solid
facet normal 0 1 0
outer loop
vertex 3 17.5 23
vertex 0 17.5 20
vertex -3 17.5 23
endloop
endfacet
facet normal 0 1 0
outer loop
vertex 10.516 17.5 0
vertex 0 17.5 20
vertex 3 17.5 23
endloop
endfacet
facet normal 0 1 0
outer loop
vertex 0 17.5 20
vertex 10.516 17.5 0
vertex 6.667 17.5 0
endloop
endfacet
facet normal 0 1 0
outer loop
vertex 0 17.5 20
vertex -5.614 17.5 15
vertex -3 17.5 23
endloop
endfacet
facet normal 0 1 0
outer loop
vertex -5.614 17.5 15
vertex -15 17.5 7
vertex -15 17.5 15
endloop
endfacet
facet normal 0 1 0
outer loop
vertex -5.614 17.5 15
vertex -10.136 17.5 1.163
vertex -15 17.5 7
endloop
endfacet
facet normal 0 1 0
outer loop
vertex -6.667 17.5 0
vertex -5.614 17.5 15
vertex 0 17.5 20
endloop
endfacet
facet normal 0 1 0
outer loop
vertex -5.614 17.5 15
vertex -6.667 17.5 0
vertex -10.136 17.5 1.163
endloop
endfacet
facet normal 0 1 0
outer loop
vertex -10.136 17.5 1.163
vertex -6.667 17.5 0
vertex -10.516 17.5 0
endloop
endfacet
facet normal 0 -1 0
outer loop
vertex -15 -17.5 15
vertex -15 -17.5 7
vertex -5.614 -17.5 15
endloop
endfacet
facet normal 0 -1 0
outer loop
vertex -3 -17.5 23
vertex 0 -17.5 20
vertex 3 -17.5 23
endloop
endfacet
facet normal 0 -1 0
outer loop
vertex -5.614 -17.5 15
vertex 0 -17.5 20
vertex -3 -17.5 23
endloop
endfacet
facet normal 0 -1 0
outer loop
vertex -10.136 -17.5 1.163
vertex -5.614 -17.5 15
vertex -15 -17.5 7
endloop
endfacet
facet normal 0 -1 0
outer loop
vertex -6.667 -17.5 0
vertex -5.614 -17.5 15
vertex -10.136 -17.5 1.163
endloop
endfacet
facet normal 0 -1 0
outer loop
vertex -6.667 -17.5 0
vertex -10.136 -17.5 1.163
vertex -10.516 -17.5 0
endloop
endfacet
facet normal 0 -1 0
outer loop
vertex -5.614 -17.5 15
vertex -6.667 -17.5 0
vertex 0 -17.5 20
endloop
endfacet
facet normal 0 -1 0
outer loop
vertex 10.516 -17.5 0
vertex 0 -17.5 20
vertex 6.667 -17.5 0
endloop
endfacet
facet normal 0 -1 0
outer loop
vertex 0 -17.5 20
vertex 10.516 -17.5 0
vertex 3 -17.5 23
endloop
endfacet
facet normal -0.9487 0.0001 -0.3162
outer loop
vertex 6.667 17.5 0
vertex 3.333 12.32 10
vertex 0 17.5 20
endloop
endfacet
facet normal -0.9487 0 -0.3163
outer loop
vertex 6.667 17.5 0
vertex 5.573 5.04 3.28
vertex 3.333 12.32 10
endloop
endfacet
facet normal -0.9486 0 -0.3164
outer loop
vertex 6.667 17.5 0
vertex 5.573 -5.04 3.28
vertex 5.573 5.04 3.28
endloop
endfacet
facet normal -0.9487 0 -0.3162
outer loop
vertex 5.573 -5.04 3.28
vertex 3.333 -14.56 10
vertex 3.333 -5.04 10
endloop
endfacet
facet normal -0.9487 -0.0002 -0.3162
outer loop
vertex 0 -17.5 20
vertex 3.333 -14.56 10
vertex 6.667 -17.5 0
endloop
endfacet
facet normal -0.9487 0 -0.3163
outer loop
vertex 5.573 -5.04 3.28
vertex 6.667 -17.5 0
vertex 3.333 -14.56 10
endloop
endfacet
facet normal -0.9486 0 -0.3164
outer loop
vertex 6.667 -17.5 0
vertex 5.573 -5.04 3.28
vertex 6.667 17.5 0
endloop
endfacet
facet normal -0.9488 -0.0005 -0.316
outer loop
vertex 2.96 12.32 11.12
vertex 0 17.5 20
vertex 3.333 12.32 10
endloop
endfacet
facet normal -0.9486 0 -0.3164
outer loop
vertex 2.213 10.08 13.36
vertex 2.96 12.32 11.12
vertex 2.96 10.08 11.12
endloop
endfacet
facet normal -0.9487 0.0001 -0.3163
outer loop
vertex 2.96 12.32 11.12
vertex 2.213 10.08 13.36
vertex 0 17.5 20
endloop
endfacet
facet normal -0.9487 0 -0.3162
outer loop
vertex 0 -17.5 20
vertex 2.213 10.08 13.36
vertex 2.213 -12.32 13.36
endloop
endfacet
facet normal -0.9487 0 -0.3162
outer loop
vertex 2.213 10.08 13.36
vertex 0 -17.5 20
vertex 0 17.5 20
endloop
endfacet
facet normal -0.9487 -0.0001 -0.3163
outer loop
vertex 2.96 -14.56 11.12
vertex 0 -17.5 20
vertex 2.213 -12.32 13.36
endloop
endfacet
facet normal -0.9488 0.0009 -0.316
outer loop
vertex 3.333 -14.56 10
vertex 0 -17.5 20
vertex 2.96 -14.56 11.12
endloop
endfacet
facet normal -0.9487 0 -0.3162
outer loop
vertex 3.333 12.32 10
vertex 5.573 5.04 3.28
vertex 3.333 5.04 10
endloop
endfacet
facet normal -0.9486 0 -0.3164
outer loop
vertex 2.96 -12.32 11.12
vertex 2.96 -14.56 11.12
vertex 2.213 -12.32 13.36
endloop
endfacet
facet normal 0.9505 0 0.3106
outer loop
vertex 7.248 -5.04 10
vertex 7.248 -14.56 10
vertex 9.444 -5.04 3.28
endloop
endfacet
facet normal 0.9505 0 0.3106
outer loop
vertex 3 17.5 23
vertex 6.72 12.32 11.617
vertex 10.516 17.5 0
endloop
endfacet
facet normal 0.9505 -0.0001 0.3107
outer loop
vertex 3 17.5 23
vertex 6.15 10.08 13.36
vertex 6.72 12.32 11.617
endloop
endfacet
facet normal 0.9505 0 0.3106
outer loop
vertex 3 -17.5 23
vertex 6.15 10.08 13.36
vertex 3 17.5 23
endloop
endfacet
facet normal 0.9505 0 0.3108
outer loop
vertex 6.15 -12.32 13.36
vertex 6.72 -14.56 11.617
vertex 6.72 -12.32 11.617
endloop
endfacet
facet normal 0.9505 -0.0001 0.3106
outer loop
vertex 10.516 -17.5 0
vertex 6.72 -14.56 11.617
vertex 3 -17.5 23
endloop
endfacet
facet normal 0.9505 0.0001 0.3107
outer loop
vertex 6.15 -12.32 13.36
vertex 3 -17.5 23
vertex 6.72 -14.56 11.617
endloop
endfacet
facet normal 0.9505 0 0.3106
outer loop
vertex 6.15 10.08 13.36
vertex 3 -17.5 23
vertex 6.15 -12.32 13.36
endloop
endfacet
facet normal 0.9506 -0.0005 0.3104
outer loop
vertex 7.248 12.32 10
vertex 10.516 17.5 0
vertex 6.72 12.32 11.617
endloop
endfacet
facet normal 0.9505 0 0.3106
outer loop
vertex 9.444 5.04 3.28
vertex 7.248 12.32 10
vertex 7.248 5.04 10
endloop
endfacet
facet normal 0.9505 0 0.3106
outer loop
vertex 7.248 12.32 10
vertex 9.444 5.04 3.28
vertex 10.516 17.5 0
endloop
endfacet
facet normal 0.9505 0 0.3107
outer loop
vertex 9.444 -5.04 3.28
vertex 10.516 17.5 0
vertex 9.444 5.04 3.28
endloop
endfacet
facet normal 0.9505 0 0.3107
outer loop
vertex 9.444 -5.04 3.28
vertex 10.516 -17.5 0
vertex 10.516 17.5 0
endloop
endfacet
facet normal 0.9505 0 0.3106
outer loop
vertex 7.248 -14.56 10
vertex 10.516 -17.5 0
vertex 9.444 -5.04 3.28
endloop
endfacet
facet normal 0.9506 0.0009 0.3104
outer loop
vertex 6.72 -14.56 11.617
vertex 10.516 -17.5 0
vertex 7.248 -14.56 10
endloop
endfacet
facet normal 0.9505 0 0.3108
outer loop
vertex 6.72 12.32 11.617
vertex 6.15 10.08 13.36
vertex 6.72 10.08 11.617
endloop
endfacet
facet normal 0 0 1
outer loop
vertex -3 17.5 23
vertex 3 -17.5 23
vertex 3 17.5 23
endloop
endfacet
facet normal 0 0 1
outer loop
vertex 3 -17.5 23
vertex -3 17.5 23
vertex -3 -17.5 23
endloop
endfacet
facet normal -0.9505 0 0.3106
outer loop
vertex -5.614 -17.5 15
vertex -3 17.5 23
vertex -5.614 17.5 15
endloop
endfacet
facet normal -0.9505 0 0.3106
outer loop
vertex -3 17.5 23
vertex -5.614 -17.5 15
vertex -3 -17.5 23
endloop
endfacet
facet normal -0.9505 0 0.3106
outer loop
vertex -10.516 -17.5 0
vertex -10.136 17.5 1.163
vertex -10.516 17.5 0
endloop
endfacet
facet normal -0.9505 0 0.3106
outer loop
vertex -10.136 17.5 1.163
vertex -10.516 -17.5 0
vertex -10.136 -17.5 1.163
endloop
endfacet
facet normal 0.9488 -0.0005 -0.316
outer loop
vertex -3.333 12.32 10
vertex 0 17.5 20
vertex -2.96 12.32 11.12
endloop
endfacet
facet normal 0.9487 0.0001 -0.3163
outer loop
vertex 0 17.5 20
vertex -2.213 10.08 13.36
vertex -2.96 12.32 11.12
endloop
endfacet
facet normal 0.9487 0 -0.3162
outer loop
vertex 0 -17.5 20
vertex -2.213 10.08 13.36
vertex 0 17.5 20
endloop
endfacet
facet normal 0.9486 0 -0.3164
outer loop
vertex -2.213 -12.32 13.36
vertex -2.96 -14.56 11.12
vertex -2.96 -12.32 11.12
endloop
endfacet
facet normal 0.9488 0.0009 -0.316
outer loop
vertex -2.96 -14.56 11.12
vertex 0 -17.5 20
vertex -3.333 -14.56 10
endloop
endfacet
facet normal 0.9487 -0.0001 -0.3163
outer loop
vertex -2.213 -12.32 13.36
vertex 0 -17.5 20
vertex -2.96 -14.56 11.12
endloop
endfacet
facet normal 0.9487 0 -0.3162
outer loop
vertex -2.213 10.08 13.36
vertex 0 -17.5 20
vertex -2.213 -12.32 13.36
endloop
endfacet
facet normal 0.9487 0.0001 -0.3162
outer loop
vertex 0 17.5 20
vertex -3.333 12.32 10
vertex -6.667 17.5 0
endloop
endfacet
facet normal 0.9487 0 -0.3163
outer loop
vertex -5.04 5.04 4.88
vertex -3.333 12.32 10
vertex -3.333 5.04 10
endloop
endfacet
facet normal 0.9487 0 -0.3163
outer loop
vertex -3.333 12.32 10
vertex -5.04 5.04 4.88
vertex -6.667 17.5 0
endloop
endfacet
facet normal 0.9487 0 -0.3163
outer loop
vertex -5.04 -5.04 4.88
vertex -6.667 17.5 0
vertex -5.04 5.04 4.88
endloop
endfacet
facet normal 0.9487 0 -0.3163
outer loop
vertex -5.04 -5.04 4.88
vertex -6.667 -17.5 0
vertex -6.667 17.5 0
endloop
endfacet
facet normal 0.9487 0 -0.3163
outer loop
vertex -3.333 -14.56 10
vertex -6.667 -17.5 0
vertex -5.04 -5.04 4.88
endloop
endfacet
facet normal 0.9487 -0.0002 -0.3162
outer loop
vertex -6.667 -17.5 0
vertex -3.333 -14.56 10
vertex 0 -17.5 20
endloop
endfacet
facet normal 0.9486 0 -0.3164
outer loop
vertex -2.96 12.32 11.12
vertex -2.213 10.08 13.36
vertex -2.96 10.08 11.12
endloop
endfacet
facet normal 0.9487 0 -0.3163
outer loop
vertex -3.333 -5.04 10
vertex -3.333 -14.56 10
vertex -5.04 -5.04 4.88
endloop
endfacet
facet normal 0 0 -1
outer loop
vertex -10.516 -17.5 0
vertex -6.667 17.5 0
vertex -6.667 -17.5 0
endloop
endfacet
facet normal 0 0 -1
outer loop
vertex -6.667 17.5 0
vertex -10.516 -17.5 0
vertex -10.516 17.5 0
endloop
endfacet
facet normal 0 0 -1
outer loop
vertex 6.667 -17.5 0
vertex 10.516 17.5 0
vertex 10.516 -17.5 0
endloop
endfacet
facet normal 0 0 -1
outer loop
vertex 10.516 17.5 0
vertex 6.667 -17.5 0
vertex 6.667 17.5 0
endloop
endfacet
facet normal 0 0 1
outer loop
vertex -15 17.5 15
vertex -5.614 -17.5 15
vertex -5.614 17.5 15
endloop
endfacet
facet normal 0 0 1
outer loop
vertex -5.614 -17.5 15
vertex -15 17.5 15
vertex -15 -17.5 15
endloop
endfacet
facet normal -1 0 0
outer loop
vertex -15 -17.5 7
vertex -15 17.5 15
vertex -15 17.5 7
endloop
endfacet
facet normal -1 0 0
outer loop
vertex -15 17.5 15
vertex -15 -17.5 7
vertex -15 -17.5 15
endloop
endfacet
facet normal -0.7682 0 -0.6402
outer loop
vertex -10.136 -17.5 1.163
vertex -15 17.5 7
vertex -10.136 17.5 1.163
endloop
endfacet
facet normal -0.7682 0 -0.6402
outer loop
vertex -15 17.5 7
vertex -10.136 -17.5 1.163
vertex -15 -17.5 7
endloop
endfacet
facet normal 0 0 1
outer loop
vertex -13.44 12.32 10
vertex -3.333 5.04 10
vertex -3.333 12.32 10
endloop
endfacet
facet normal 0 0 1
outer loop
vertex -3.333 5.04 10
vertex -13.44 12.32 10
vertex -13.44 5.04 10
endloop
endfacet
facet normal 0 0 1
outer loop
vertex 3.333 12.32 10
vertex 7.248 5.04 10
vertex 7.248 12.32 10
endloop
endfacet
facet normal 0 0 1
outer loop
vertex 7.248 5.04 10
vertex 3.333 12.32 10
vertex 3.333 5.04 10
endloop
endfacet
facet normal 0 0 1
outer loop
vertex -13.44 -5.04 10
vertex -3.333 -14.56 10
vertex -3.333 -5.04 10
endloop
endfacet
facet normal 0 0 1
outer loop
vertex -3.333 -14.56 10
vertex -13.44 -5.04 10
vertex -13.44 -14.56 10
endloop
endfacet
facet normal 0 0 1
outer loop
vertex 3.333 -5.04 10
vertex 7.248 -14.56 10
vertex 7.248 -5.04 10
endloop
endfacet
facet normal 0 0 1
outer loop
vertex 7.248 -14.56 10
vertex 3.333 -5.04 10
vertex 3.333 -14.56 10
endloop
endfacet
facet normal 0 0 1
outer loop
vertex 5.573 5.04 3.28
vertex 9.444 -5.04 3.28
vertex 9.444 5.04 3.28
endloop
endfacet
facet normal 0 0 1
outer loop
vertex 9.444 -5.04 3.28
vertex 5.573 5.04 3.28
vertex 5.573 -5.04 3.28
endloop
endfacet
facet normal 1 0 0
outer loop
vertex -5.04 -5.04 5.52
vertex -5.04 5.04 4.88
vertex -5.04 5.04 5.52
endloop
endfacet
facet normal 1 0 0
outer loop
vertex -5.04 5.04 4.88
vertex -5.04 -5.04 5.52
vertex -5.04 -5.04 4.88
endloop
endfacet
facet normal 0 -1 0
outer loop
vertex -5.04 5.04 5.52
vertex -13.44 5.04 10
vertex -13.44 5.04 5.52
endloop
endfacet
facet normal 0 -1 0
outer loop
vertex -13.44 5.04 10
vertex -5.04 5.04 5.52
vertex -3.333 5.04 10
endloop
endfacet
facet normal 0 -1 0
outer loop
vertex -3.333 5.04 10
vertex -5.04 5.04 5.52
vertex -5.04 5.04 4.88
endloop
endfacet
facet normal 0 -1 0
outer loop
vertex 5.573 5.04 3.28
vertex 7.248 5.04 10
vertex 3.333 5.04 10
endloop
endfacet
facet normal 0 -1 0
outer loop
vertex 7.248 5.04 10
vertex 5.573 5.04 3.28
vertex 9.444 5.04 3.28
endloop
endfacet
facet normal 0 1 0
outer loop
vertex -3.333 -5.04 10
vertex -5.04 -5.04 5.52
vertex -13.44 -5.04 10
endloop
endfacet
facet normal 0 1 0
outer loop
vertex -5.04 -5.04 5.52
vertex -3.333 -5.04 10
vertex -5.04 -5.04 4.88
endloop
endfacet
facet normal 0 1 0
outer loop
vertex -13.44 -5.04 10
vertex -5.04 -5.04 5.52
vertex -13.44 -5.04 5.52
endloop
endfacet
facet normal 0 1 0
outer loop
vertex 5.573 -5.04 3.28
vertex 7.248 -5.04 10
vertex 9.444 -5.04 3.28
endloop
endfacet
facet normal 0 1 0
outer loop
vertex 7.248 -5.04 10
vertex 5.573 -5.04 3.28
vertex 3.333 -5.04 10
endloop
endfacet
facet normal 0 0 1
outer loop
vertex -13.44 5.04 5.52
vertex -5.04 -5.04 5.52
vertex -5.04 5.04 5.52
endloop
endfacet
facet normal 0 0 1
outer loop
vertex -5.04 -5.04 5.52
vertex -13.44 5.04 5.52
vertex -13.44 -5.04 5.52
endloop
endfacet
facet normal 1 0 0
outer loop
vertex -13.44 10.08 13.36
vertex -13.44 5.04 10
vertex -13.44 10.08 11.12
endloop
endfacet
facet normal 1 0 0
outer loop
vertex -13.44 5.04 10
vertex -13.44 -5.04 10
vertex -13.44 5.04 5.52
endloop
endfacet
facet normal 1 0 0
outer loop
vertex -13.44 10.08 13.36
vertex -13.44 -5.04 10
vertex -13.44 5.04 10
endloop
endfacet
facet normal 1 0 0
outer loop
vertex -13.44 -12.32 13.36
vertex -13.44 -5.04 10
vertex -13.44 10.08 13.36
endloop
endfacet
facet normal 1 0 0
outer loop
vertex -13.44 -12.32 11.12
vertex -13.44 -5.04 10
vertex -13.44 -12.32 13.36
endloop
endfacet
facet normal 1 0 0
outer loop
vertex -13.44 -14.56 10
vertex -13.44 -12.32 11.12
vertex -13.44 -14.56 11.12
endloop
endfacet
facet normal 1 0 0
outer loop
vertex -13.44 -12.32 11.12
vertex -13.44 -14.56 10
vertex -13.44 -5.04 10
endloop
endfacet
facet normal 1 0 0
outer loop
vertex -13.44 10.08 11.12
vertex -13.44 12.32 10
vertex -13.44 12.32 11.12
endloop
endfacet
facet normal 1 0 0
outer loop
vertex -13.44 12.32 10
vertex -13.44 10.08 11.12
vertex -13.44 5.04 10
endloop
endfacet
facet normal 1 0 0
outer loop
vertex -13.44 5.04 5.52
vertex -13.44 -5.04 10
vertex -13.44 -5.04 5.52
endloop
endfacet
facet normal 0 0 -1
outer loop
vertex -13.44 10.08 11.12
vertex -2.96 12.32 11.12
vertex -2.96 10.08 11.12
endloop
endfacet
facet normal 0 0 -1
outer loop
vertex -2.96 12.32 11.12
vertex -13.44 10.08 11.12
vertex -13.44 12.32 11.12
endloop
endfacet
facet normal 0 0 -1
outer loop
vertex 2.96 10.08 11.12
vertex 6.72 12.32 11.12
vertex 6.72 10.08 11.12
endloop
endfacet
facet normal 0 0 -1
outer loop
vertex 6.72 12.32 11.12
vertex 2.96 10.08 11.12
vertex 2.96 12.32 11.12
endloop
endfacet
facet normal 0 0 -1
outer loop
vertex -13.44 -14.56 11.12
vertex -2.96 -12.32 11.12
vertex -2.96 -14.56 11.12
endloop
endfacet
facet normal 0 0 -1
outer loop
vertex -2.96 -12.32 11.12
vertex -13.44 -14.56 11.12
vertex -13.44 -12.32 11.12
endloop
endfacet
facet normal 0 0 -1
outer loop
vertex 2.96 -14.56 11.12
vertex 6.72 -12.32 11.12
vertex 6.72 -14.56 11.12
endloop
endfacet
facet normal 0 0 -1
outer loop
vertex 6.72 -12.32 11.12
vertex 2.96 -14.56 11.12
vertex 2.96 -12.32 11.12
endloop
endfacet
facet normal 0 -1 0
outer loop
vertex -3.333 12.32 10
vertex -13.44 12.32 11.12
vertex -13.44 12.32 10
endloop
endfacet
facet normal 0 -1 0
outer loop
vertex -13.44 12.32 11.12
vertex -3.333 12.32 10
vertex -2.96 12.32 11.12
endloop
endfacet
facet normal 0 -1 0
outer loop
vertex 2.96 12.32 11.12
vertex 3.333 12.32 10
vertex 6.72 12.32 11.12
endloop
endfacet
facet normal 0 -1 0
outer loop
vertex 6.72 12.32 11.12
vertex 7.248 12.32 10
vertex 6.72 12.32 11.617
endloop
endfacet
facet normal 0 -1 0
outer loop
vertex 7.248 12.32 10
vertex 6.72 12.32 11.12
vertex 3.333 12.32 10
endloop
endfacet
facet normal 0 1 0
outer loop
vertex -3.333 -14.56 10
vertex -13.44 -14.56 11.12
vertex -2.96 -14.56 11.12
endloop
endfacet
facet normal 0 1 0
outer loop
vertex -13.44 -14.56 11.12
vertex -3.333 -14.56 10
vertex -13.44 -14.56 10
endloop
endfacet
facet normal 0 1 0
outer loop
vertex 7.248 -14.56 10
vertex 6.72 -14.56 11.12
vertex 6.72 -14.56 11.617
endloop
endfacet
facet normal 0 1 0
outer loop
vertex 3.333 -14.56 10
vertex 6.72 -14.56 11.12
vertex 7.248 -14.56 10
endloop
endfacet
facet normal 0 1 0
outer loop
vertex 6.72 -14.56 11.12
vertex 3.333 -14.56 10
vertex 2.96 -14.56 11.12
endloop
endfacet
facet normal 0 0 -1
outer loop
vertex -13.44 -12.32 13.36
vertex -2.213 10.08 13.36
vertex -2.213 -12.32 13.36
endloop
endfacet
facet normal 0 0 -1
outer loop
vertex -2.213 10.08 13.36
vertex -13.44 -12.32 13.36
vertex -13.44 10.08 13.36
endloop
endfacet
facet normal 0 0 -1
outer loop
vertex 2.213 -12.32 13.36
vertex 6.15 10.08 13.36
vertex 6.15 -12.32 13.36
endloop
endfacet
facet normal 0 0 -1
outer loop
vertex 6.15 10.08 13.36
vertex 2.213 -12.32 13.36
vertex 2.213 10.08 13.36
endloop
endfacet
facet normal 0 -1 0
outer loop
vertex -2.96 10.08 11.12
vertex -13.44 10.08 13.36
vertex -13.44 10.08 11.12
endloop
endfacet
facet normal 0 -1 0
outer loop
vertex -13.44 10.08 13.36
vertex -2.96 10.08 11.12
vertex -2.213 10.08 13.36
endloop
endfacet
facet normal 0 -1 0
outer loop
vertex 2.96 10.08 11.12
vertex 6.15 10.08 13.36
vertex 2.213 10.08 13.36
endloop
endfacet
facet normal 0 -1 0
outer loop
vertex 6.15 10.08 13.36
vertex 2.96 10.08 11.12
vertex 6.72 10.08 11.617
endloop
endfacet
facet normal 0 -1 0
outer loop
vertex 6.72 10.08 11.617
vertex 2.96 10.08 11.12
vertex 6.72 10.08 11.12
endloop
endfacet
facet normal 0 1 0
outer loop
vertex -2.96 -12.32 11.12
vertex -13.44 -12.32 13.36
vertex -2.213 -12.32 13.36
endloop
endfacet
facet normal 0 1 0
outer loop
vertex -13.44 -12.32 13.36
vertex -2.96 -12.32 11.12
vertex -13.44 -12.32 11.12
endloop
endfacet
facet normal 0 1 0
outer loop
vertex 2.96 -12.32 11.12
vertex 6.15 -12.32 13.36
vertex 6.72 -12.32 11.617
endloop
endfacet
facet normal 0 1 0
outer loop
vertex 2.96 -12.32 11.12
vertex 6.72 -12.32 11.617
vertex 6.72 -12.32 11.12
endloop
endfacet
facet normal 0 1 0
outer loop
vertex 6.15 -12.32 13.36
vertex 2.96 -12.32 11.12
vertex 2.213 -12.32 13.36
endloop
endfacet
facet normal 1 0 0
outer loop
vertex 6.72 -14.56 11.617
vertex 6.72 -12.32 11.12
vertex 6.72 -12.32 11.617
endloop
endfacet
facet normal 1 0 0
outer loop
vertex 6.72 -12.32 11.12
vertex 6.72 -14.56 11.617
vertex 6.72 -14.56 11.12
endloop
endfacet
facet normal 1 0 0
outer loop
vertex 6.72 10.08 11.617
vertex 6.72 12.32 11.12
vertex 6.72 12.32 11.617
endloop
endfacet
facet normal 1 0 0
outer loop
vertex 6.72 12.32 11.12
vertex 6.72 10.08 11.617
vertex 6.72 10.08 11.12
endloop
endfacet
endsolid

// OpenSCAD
module PicamV13(){
    thickness = 1;
    length = 24;
    width = 24;
    components_offset_width = 2;
    components_height = 2;
    components_width = 20;
    components_length = 20;
    plug_width = width;
    plug_length = 6;
    plug_height = 3;
    plug_offset_length = length - plug_length;
    plug_offset_width = 0;
    cam_sidelength = 9;
    cam_height = 6;
    cam_offset_width = 13-cam_sidelength/2;
    cam_offset_length = 12-cam_sidelength/2;
    
    translate([-cam_offset_length-cam_sidelength/2,-cam_offset_width-cam_sidelength/2,0])
    union(){
        cube([length, width, thickness]);
    
        translate([0, components_offset_width, thickness])
        color("blue", 1)
        cube([components_length, components_width, components_height]);
        
        translate([cam_offset_length,cam_offset_width,-cam_height])
        color("red", 1)
        union(){
            cube([cam_sidelength+7.5, cam_sidelength, cam_height]);
            translate([-7.5,0,2])
            cube([7.5, cam_sidelength, 4]);
        }
        
        translate([plug_offset_length,plug_offset_width,thickness])
        color("green", 1)
        cube([plug_length, plug_width, plug_height]);
    }
}


module straight_arch(){
    s = 100;
    w = 3;
    hc = 150;
    l = 35;
    cut = 130;
    translate([-s/2,0,-cut])
    difference(){
        translate([0,l/2])
        rotate([90,0,0])
        linear_extrude(l)
        polygon([[-w,0], [0,0], [s/2,hc], [s,0], 
             [s+w,0], [s/2+w,hc+w], [s/2-w,hc+w]]);
        
        translate([-200,-200])
        cube([500,500,cut]);
    }
}

module Cam_Top(){
    difference(){
        l = 35;
        w = 10;
        h = 8;
        union(){
            straight_arch();
            translate([-w-5,-l/2,h-1])
            color("orange", 1)
            union(){
                difference(){
                    cube([w,l,h]);
                    //translate([2,15,h-1])
                    //linear_extrude(1)
                    //text("x");
                }
                translate([h,l,-h])
                rotate([90,-90])
                linear_extrude(l)
                polygon([[2,3], [h,h], [h,0]]);
            }
        }
        sc = 1.12;
        translate([0,0,10])
        scale([sc,sc,sc])
        PicamV13();
    }
}

Cam_Top();
//PicamV13();
